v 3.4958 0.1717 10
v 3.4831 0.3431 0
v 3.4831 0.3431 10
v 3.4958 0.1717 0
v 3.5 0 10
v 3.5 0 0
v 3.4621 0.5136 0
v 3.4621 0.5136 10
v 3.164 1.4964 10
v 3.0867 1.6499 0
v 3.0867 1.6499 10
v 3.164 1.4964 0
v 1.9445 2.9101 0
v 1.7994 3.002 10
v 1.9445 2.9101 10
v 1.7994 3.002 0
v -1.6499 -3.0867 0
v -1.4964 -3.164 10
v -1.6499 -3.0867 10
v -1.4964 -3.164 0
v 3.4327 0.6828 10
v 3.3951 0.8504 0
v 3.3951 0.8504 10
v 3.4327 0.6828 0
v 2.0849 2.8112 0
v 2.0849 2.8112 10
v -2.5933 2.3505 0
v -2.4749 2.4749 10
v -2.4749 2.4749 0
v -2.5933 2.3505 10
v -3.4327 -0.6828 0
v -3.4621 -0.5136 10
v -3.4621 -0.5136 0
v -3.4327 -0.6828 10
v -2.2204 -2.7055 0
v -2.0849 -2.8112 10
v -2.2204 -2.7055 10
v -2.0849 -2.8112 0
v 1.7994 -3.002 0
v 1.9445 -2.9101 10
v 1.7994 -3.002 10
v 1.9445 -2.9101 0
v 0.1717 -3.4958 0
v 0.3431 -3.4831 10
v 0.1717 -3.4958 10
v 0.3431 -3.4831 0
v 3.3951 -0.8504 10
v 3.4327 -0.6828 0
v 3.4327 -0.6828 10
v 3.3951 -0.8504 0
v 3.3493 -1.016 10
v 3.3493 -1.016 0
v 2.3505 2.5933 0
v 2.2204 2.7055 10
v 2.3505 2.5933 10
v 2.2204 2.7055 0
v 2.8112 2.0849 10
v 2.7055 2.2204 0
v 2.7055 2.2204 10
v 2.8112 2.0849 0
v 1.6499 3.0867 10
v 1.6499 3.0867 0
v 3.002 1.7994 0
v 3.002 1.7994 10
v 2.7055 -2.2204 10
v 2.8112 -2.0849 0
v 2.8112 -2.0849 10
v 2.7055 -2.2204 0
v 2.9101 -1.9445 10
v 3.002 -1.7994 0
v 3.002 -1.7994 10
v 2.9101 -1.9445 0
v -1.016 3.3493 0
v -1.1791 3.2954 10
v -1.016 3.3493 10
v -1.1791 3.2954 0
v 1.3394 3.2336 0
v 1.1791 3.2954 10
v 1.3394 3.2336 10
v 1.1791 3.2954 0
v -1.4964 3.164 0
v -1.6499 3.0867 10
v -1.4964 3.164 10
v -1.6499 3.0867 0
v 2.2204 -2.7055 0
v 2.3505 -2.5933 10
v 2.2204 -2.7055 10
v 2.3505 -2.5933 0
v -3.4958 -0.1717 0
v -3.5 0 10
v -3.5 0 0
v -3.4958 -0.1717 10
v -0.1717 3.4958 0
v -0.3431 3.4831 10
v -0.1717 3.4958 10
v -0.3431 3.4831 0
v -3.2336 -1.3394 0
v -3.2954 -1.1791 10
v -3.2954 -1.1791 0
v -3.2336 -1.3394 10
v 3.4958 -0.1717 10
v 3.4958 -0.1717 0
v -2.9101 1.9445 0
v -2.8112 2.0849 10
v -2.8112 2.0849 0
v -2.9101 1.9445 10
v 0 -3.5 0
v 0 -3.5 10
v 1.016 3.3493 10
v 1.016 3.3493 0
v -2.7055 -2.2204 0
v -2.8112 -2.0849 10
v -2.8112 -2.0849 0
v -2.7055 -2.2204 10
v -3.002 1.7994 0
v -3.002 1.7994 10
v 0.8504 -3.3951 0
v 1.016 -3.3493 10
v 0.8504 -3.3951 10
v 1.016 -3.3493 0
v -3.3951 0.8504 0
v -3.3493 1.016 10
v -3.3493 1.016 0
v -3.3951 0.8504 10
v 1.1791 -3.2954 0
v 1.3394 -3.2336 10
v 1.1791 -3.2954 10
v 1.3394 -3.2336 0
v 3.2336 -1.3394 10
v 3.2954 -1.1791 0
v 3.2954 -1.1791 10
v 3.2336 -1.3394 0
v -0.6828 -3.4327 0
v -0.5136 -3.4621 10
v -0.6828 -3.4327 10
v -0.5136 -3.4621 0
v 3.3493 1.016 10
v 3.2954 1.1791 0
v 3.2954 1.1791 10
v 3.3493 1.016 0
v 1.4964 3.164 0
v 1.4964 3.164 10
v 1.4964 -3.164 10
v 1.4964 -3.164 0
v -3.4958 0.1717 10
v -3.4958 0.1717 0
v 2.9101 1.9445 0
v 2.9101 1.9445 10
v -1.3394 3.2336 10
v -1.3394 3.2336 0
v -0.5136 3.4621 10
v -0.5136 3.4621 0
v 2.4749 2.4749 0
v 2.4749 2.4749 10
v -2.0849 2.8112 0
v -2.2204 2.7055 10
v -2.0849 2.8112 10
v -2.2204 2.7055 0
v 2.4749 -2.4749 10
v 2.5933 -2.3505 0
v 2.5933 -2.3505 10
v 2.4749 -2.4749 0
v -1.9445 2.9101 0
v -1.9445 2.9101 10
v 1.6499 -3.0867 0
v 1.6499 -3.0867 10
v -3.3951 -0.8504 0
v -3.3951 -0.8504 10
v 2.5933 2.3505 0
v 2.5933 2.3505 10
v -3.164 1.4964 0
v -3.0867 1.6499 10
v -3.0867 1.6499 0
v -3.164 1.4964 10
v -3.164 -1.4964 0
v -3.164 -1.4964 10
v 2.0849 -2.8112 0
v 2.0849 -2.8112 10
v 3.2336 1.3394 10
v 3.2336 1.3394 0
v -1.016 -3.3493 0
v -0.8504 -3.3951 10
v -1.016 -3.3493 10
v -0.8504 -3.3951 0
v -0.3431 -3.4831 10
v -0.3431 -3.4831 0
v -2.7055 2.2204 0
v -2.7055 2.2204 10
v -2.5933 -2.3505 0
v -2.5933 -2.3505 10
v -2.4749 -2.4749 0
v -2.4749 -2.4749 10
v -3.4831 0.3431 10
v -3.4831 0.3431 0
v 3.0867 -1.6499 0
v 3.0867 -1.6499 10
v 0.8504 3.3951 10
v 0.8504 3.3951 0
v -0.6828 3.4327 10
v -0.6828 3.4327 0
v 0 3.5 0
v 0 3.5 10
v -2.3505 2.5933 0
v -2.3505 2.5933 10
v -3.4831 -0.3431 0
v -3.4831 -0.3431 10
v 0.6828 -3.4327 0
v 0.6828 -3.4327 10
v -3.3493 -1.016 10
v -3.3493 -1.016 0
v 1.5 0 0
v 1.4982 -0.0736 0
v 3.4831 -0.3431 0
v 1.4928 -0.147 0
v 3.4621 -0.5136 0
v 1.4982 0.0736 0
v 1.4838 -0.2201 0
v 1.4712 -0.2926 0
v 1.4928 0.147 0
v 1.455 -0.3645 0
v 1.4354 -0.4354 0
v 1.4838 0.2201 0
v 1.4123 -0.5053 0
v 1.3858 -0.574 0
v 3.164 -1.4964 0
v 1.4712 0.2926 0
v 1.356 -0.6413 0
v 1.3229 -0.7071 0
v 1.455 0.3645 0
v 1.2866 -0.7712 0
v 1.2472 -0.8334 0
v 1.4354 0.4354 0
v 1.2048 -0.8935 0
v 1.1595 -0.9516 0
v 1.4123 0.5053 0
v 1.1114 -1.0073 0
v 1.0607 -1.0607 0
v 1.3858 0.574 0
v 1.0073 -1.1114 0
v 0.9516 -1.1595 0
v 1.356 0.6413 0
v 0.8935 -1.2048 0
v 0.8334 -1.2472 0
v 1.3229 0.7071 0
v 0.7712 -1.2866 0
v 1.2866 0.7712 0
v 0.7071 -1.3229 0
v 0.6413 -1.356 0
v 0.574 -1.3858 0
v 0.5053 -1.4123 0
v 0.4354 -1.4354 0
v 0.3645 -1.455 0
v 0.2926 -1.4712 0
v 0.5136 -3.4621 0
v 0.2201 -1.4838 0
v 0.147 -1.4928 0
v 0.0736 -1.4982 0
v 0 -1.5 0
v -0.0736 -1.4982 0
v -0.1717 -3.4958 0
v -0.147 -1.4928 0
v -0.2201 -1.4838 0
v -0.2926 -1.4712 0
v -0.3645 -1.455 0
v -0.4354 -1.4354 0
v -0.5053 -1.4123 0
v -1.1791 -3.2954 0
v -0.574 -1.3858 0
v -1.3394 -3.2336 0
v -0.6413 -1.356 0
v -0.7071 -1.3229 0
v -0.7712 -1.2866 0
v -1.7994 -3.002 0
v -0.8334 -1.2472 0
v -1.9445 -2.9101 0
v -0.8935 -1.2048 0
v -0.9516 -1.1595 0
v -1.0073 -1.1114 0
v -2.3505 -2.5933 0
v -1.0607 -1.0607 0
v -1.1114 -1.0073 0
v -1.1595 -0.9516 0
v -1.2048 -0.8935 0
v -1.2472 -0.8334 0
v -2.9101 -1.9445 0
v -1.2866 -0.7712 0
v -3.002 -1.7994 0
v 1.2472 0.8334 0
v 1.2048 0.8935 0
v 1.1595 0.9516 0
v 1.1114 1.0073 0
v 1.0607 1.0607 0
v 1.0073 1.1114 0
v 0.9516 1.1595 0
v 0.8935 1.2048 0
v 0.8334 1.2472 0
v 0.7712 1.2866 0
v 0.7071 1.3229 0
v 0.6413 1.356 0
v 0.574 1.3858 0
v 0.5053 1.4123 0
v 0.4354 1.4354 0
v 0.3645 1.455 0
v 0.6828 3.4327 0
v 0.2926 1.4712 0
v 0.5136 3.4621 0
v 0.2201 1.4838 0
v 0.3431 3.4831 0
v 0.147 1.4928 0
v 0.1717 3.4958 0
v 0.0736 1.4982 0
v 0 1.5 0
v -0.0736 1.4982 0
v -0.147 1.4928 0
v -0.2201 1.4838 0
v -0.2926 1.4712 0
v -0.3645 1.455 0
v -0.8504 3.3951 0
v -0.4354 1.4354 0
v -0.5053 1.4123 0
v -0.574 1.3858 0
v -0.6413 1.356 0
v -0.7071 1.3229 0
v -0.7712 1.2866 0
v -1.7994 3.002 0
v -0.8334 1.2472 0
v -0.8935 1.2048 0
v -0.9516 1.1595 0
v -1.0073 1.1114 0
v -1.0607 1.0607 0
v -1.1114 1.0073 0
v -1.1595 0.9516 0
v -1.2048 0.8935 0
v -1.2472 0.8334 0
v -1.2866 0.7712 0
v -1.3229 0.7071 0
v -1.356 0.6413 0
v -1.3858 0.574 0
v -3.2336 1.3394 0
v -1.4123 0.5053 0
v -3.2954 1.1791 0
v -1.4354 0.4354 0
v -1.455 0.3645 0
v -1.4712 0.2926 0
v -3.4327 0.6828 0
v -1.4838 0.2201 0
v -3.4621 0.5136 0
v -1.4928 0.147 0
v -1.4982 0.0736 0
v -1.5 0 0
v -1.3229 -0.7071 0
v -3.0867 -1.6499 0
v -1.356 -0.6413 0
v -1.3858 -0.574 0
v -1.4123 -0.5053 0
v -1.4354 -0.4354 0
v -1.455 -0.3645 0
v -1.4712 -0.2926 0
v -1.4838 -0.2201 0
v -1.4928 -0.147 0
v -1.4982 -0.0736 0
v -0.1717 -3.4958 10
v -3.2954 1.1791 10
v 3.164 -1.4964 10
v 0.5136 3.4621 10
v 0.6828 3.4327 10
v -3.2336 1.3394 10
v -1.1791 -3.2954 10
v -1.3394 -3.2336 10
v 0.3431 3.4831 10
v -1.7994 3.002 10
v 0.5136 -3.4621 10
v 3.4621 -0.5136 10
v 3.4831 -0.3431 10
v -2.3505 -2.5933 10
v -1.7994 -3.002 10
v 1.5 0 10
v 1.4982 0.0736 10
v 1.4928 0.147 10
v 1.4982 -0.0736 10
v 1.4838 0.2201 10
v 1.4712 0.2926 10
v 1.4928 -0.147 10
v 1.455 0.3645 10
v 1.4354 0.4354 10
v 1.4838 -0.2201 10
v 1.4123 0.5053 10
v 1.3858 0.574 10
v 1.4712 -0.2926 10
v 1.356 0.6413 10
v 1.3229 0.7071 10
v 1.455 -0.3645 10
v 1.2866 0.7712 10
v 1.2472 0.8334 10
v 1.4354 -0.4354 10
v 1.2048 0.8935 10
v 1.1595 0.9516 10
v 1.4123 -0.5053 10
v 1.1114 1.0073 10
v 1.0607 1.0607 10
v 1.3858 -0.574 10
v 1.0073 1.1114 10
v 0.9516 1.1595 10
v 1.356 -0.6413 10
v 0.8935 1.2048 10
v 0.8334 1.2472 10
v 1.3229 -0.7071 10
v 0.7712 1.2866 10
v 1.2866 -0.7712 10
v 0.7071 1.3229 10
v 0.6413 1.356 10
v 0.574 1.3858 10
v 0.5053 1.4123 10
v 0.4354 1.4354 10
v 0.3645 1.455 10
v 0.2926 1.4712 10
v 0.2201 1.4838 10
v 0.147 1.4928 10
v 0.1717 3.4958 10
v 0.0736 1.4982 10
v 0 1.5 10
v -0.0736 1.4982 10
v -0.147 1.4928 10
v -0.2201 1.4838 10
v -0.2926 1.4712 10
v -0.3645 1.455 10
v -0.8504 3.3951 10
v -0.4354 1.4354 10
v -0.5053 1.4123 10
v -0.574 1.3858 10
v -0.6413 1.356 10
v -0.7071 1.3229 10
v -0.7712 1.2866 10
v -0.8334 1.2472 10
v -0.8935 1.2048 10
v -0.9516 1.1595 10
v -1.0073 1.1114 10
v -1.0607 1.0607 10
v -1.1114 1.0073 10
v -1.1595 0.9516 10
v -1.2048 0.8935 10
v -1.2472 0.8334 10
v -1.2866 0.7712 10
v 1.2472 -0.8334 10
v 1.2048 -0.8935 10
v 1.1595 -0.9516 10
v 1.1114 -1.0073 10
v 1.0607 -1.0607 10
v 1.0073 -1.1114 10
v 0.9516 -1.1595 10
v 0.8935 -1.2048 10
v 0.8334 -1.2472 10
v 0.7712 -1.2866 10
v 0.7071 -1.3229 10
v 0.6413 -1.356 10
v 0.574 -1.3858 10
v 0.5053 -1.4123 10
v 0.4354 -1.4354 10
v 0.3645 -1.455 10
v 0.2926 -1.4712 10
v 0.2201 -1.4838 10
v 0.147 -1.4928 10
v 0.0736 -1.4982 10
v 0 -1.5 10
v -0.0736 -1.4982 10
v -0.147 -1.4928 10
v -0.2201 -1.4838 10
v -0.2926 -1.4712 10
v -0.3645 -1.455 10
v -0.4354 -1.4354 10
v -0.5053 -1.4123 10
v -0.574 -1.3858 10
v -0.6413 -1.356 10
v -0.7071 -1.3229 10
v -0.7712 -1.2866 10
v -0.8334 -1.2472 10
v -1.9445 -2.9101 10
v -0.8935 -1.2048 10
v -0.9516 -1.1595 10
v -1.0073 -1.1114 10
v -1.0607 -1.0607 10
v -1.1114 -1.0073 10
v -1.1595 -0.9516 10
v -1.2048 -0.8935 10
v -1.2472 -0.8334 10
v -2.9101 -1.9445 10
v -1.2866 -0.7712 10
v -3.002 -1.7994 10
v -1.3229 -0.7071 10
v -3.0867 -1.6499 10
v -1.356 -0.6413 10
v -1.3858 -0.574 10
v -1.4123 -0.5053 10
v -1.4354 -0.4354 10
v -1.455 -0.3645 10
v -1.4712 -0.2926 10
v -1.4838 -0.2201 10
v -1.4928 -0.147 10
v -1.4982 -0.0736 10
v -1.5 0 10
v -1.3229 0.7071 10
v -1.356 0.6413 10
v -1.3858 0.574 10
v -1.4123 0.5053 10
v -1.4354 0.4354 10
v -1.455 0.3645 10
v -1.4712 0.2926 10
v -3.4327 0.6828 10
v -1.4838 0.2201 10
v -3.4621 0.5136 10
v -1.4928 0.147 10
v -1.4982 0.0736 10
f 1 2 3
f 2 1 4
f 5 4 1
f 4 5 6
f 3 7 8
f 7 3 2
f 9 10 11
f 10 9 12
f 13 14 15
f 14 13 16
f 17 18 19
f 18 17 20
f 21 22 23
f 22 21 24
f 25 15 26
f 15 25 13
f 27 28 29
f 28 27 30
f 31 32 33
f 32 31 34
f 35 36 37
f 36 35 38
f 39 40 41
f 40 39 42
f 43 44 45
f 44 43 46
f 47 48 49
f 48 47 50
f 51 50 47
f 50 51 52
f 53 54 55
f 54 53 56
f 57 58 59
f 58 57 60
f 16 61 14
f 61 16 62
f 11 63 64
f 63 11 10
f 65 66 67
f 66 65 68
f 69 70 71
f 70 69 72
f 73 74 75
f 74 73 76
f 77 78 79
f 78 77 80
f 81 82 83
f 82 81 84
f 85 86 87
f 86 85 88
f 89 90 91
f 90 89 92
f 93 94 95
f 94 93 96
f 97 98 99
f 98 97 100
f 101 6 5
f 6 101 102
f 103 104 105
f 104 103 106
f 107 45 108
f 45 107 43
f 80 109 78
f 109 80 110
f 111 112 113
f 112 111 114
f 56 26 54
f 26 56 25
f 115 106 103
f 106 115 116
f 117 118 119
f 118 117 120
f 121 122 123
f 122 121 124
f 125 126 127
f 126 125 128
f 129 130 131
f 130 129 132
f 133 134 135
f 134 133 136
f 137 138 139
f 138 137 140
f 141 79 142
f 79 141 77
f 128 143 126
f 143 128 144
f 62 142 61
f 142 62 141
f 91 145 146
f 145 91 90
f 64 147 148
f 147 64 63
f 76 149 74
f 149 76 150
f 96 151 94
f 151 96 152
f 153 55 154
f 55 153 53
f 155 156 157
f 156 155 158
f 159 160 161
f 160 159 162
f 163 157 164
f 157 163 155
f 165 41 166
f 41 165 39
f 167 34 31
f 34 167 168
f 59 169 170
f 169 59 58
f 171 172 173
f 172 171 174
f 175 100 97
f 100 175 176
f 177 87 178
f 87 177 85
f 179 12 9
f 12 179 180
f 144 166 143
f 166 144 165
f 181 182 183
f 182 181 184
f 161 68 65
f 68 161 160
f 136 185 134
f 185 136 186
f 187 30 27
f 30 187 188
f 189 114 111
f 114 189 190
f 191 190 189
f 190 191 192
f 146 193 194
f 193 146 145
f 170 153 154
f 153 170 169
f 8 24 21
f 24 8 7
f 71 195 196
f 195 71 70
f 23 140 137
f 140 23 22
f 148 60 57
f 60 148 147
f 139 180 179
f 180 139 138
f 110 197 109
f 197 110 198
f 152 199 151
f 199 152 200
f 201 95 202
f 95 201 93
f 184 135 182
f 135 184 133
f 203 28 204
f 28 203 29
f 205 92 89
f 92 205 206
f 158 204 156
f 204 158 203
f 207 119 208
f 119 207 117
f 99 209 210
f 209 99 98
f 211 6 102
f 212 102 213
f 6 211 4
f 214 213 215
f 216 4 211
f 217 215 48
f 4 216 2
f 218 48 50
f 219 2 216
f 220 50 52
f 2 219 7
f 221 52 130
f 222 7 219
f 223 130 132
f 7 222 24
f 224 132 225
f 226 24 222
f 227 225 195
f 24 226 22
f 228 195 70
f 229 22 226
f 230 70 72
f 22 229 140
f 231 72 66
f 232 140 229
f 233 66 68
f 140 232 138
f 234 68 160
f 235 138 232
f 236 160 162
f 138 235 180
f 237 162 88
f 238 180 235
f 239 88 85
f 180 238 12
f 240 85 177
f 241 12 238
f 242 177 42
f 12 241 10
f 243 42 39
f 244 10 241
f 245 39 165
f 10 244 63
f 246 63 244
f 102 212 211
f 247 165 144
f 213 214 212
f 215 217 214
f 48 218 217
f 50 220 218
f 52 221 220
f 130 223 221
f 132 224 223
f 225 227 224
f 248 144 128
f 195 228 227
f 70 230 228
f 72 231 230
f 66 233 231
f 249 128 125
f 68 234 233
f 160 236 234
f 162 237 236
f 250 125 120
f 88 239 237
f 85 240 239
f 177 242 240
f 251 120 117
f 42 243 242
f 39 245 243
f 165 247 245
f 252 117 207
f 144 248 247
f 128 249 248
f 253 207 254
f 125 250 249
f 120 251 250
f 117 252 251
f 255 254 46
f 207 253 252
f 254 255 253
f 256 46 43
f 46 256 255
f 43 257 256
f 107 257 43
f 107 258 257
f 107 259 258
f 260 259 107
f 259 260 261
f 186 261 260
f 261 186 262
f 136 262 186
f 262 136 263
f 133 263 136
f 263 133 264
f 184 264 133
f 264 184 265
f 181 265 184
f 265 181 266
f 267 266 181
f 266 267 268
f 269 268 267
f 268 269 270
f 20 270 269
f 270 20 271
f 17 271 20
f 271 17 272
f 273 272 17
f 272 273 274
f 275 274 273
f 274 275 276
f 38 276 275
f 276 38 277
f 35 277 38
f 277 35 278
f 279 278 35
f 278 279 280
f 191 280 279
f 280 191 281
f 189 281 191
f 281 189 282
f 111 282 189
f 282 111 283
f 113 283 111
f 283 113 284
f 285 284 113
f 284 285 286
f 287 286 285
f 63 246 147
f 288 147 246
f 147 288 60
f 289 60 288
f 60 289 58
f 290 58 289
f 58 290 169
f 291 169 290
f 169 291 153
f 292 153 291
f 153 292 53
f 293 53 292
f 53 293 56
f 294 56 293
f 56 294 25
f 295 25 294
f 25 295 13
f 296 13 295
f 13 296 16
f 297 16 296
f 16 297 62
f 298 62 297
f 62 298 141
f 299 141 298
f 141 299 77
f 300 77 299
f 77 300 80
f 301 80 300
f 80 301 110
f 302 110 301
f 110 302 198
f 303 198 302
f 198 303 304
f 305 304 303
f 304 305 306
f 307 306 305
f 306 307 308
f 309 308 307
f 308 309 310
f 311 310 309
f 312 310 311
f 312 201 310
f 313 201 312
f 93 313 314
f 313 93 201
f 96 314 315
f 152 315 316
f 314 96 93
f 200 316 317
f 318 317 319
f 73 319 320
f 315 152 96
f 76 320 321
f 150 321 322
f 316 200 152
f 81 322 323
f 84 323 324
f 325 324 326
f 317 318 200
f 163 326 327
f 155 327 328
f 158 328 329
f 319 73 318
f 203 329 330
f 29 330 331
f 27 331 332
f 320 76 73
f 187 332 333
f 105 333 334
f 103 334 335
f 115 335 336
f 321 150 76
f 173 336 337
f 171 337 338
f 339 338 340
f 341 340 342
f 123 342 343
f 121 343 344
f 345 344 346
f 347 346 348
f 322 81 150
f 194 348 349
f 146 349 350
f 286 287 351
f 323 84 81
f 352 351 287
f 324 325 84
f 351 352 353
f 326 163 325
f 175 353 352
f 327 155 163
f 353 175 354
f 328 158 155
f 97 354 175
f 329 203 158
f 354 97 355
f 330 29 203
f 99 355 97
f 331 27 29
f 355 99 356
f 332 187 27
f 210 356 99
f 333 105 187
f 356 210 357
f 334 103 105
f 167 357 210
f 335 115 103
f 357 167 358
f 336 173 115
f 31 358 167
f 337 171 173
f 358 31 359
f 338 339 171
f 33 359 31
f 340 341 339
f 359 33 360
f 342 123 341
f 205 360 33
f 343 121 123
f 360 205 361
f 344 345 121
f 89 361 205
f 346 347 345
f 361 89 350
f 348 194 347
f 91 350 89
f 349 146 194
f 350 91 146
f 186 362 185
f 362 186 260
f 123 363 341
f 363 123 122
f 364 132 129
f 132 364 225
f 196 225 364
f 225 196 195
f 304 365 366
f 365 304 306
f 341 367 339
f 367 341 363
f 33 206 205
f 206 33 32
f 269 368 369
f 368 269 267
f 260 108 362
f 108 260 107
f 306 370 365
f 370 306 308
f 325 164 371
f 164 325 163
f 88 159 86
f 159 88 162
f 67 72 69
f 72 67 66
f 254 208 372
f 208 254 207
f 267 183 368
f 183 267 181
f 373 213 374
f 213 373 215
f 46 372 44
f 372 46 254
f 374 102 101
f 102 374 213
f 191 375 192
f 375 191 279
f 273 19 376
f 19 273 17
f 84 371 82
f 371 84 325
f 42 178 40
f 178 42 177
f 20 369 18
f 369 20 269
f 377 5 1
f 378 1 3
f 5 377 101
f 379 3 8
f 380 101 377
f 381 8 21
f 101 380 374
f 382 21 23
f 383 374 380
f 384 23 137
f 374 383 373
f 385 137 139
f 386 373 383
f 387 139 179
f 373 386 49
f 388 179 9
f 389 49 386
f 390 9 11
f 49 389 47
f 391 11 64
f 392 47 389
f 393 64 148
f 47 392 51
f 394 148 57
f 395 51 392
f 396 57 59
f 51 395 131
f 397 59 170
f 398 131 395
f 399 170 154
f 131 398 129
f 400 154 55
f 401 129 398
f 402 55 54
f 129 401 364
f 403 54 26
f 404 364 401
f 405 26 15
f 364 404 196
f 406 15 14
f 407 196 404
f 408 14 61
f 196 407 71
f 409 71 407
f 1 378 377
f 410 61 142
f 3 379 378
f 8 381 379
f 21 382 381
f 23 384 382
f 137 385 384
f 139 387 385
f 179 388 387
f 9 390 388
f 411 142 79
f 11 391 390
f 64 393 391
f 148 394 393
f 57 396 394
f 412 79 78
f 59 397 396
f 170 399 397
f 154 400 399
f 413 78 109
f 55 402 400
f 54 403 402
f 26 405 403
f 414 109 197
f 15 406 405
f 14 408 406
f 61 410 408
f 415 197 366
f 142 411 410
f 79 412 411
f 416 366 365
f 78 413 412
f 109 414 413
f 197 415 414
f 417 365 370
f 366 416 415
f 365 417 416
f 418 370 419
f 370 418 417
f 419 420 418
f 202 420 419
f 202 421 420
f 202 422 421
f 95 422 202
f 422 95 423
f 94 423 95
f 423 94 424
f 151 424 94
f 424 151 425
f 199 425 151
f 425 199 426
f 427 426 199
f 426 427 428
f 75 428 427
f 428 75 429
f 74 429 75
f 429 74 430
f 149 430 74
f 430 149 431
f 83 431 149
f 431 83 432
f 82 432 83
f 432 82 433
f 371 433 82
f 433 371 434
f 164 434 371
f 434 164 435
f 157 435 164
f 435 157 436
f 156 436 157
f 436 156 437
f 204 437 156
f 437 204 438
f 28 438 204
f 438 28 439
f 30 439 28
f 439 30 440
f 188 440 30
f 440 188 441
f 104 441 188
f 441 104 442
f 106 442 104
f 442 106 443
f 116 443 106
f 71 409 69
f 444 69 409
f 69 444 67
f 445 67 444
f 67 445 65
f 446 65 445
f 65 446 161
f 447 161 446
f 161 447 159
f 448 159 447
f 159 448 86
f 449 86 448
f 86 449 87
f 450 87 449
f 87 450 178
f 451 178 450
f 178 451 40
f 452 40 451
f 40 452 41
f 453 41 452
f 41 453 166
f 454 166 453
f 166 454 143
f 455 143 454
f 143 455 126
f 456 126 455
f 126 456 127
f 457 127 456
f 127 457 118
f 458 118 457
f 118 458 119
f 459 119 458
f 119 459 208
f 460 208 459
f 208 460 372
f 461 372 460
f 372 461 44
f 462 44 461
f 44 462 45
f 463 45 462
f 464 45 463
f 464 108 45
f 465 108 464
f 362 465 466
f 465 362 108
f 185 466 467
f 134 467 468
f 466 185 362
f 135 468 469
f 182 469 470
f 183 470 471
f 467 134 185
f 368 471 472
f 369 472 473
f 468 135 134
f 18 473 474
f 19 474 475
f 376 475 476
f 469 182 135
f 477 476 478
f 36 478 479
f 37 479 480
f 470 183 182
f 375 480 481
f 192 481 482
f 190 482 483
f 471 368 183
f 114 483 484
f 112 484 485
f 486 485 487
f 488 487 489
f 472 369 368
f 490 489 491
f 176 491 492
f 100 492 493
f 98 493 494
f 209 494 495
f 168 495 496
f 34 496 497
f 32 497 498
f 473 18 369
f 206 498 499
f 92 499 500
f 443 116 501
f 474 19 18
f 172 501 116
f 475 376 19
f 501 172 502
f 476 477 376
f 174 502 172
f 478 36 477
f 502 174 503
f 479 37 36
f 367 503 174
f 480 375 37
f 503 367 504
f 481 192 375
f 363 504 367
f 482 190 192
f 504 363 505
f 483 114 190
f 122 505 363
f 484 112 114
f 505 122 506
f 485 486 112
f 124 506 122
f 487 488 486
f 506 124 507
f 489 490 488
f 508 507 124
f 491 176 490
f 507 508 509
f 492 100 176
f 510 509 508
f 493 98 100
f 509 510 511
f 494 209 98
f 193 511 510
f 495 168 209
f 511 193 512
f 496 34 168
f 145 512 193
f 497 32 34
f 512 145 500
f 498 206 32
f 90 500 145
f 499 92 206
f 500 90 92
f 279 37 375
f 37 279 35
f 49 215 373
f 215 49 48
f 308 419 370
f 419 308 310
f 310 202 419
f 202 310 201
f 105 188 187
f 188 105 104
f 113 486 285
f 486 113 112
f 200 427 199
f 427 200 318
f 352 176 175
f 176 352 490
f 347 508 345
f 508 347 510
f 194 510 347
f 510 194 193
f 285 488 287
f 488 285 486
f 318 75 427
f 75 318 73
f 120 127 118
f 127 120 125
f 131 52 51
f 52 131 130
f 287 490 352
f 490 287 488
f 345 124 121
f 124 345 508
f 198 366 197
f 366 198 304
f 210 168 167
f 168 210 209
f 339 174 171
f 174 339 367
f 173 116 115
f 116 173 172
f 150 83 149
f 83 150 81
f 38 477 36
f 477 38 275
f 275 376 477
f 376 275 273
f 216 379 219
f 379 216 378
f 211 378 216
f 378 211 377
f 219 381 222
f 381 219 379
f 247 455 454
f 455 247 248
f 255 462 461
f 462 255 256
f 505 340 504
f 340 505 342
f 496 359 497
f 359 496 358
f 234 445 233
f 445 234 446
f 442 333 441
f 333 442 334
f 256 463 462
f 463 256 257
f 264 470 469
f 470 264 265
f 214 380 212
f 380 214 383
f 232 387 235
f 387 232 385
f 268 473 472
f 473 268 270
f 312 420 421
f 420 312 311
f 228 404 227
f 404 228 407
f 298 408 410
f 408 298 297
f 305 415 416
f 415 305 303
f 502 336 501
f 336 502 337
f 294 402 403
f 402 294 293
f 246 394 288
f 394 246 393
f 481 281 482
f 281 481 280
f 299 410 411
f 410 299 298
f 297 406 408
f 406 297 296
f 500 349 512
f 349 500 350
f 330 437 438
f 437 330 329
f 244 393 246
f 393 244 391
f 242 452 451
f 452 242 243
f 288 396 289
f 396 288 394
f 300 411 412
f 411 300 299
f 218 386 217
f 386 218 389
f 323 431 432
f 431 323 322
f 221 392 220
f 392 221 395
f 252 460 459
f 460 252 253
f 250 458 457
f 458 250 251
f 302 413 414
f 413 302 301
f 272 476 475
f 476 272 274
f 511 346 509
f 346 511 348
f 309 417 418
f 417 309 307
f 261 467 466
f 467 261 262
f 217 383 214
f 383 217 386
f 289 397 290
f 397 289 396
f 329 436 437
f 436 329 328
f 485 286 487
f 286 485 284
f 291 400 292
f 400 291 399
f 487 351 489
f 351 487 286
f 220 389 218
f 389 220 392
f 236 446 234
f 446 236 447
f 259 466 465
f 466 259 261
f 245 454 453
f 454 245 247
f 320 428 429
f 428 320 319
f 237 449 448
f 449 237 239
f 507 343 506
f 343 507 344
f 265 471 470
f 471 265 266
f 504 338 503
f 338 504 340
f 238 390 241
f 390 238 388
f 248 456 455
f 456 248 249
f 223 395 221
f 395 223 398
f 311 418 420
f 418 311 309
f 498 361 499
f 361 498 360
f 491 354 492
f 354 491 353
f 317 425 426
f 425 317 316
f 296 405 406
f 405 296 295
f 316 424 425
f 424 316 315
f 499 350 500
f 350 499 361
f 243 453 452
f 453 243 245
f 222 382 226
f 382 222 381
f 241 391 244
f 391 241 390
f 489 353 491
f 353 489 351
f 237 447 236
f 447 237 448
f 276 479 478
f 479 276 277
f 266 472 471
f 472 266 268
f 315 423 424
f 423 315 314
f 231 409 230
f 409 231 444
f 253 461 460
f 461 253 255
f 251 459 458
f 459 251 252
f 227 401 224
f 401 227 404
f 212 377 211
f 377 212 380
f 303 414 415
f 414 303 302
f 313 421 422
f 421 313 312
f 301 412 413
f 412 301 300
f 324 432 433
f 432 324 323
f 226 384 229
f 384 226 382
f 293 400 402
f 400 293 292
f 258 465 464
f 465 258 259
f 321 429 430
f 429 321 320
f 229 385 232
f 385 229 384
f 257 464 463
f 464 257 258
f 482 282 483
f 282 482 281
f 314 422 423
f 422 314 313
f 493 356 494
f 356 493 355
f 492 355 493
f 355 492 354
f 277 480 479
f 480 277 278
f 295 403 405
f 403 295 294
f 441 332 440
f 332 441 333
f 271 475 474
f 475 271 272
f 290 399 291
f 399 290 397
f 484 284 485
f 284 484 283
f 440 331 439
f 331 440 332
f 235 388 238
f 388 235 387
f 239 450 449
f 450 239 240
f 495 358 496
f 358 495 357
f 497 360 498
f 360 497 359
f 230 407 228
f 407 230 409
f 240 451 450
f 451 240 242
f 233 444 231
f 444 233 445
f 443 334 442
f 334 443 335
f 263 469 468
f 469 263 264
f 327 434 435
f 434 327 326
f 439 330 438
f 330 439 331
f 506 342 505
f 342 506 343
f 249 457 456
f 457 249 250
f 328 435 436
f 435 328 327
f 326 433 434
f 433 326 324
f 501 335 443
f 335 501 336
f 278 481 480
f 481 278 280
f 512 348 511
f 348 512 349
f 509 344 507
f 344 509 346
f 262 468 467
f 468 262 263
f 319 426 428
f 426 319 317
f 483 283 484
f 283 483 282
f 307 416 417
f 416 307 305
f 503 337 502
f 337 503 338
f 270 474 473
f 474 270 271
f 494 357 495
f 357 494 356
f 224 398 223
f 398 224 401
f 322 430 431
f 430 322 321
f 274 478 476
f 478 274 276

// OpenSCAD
$fn = 128;

bore_d = 3.0;
od_d   = 7.0;
len    = 10.0;

difference() {
  cylinder(d = od_d, h = len, center = false);
  translate([0,0,-0.1]) cylinder(d = bore_d, h = len + 0.2, center = false);
}
